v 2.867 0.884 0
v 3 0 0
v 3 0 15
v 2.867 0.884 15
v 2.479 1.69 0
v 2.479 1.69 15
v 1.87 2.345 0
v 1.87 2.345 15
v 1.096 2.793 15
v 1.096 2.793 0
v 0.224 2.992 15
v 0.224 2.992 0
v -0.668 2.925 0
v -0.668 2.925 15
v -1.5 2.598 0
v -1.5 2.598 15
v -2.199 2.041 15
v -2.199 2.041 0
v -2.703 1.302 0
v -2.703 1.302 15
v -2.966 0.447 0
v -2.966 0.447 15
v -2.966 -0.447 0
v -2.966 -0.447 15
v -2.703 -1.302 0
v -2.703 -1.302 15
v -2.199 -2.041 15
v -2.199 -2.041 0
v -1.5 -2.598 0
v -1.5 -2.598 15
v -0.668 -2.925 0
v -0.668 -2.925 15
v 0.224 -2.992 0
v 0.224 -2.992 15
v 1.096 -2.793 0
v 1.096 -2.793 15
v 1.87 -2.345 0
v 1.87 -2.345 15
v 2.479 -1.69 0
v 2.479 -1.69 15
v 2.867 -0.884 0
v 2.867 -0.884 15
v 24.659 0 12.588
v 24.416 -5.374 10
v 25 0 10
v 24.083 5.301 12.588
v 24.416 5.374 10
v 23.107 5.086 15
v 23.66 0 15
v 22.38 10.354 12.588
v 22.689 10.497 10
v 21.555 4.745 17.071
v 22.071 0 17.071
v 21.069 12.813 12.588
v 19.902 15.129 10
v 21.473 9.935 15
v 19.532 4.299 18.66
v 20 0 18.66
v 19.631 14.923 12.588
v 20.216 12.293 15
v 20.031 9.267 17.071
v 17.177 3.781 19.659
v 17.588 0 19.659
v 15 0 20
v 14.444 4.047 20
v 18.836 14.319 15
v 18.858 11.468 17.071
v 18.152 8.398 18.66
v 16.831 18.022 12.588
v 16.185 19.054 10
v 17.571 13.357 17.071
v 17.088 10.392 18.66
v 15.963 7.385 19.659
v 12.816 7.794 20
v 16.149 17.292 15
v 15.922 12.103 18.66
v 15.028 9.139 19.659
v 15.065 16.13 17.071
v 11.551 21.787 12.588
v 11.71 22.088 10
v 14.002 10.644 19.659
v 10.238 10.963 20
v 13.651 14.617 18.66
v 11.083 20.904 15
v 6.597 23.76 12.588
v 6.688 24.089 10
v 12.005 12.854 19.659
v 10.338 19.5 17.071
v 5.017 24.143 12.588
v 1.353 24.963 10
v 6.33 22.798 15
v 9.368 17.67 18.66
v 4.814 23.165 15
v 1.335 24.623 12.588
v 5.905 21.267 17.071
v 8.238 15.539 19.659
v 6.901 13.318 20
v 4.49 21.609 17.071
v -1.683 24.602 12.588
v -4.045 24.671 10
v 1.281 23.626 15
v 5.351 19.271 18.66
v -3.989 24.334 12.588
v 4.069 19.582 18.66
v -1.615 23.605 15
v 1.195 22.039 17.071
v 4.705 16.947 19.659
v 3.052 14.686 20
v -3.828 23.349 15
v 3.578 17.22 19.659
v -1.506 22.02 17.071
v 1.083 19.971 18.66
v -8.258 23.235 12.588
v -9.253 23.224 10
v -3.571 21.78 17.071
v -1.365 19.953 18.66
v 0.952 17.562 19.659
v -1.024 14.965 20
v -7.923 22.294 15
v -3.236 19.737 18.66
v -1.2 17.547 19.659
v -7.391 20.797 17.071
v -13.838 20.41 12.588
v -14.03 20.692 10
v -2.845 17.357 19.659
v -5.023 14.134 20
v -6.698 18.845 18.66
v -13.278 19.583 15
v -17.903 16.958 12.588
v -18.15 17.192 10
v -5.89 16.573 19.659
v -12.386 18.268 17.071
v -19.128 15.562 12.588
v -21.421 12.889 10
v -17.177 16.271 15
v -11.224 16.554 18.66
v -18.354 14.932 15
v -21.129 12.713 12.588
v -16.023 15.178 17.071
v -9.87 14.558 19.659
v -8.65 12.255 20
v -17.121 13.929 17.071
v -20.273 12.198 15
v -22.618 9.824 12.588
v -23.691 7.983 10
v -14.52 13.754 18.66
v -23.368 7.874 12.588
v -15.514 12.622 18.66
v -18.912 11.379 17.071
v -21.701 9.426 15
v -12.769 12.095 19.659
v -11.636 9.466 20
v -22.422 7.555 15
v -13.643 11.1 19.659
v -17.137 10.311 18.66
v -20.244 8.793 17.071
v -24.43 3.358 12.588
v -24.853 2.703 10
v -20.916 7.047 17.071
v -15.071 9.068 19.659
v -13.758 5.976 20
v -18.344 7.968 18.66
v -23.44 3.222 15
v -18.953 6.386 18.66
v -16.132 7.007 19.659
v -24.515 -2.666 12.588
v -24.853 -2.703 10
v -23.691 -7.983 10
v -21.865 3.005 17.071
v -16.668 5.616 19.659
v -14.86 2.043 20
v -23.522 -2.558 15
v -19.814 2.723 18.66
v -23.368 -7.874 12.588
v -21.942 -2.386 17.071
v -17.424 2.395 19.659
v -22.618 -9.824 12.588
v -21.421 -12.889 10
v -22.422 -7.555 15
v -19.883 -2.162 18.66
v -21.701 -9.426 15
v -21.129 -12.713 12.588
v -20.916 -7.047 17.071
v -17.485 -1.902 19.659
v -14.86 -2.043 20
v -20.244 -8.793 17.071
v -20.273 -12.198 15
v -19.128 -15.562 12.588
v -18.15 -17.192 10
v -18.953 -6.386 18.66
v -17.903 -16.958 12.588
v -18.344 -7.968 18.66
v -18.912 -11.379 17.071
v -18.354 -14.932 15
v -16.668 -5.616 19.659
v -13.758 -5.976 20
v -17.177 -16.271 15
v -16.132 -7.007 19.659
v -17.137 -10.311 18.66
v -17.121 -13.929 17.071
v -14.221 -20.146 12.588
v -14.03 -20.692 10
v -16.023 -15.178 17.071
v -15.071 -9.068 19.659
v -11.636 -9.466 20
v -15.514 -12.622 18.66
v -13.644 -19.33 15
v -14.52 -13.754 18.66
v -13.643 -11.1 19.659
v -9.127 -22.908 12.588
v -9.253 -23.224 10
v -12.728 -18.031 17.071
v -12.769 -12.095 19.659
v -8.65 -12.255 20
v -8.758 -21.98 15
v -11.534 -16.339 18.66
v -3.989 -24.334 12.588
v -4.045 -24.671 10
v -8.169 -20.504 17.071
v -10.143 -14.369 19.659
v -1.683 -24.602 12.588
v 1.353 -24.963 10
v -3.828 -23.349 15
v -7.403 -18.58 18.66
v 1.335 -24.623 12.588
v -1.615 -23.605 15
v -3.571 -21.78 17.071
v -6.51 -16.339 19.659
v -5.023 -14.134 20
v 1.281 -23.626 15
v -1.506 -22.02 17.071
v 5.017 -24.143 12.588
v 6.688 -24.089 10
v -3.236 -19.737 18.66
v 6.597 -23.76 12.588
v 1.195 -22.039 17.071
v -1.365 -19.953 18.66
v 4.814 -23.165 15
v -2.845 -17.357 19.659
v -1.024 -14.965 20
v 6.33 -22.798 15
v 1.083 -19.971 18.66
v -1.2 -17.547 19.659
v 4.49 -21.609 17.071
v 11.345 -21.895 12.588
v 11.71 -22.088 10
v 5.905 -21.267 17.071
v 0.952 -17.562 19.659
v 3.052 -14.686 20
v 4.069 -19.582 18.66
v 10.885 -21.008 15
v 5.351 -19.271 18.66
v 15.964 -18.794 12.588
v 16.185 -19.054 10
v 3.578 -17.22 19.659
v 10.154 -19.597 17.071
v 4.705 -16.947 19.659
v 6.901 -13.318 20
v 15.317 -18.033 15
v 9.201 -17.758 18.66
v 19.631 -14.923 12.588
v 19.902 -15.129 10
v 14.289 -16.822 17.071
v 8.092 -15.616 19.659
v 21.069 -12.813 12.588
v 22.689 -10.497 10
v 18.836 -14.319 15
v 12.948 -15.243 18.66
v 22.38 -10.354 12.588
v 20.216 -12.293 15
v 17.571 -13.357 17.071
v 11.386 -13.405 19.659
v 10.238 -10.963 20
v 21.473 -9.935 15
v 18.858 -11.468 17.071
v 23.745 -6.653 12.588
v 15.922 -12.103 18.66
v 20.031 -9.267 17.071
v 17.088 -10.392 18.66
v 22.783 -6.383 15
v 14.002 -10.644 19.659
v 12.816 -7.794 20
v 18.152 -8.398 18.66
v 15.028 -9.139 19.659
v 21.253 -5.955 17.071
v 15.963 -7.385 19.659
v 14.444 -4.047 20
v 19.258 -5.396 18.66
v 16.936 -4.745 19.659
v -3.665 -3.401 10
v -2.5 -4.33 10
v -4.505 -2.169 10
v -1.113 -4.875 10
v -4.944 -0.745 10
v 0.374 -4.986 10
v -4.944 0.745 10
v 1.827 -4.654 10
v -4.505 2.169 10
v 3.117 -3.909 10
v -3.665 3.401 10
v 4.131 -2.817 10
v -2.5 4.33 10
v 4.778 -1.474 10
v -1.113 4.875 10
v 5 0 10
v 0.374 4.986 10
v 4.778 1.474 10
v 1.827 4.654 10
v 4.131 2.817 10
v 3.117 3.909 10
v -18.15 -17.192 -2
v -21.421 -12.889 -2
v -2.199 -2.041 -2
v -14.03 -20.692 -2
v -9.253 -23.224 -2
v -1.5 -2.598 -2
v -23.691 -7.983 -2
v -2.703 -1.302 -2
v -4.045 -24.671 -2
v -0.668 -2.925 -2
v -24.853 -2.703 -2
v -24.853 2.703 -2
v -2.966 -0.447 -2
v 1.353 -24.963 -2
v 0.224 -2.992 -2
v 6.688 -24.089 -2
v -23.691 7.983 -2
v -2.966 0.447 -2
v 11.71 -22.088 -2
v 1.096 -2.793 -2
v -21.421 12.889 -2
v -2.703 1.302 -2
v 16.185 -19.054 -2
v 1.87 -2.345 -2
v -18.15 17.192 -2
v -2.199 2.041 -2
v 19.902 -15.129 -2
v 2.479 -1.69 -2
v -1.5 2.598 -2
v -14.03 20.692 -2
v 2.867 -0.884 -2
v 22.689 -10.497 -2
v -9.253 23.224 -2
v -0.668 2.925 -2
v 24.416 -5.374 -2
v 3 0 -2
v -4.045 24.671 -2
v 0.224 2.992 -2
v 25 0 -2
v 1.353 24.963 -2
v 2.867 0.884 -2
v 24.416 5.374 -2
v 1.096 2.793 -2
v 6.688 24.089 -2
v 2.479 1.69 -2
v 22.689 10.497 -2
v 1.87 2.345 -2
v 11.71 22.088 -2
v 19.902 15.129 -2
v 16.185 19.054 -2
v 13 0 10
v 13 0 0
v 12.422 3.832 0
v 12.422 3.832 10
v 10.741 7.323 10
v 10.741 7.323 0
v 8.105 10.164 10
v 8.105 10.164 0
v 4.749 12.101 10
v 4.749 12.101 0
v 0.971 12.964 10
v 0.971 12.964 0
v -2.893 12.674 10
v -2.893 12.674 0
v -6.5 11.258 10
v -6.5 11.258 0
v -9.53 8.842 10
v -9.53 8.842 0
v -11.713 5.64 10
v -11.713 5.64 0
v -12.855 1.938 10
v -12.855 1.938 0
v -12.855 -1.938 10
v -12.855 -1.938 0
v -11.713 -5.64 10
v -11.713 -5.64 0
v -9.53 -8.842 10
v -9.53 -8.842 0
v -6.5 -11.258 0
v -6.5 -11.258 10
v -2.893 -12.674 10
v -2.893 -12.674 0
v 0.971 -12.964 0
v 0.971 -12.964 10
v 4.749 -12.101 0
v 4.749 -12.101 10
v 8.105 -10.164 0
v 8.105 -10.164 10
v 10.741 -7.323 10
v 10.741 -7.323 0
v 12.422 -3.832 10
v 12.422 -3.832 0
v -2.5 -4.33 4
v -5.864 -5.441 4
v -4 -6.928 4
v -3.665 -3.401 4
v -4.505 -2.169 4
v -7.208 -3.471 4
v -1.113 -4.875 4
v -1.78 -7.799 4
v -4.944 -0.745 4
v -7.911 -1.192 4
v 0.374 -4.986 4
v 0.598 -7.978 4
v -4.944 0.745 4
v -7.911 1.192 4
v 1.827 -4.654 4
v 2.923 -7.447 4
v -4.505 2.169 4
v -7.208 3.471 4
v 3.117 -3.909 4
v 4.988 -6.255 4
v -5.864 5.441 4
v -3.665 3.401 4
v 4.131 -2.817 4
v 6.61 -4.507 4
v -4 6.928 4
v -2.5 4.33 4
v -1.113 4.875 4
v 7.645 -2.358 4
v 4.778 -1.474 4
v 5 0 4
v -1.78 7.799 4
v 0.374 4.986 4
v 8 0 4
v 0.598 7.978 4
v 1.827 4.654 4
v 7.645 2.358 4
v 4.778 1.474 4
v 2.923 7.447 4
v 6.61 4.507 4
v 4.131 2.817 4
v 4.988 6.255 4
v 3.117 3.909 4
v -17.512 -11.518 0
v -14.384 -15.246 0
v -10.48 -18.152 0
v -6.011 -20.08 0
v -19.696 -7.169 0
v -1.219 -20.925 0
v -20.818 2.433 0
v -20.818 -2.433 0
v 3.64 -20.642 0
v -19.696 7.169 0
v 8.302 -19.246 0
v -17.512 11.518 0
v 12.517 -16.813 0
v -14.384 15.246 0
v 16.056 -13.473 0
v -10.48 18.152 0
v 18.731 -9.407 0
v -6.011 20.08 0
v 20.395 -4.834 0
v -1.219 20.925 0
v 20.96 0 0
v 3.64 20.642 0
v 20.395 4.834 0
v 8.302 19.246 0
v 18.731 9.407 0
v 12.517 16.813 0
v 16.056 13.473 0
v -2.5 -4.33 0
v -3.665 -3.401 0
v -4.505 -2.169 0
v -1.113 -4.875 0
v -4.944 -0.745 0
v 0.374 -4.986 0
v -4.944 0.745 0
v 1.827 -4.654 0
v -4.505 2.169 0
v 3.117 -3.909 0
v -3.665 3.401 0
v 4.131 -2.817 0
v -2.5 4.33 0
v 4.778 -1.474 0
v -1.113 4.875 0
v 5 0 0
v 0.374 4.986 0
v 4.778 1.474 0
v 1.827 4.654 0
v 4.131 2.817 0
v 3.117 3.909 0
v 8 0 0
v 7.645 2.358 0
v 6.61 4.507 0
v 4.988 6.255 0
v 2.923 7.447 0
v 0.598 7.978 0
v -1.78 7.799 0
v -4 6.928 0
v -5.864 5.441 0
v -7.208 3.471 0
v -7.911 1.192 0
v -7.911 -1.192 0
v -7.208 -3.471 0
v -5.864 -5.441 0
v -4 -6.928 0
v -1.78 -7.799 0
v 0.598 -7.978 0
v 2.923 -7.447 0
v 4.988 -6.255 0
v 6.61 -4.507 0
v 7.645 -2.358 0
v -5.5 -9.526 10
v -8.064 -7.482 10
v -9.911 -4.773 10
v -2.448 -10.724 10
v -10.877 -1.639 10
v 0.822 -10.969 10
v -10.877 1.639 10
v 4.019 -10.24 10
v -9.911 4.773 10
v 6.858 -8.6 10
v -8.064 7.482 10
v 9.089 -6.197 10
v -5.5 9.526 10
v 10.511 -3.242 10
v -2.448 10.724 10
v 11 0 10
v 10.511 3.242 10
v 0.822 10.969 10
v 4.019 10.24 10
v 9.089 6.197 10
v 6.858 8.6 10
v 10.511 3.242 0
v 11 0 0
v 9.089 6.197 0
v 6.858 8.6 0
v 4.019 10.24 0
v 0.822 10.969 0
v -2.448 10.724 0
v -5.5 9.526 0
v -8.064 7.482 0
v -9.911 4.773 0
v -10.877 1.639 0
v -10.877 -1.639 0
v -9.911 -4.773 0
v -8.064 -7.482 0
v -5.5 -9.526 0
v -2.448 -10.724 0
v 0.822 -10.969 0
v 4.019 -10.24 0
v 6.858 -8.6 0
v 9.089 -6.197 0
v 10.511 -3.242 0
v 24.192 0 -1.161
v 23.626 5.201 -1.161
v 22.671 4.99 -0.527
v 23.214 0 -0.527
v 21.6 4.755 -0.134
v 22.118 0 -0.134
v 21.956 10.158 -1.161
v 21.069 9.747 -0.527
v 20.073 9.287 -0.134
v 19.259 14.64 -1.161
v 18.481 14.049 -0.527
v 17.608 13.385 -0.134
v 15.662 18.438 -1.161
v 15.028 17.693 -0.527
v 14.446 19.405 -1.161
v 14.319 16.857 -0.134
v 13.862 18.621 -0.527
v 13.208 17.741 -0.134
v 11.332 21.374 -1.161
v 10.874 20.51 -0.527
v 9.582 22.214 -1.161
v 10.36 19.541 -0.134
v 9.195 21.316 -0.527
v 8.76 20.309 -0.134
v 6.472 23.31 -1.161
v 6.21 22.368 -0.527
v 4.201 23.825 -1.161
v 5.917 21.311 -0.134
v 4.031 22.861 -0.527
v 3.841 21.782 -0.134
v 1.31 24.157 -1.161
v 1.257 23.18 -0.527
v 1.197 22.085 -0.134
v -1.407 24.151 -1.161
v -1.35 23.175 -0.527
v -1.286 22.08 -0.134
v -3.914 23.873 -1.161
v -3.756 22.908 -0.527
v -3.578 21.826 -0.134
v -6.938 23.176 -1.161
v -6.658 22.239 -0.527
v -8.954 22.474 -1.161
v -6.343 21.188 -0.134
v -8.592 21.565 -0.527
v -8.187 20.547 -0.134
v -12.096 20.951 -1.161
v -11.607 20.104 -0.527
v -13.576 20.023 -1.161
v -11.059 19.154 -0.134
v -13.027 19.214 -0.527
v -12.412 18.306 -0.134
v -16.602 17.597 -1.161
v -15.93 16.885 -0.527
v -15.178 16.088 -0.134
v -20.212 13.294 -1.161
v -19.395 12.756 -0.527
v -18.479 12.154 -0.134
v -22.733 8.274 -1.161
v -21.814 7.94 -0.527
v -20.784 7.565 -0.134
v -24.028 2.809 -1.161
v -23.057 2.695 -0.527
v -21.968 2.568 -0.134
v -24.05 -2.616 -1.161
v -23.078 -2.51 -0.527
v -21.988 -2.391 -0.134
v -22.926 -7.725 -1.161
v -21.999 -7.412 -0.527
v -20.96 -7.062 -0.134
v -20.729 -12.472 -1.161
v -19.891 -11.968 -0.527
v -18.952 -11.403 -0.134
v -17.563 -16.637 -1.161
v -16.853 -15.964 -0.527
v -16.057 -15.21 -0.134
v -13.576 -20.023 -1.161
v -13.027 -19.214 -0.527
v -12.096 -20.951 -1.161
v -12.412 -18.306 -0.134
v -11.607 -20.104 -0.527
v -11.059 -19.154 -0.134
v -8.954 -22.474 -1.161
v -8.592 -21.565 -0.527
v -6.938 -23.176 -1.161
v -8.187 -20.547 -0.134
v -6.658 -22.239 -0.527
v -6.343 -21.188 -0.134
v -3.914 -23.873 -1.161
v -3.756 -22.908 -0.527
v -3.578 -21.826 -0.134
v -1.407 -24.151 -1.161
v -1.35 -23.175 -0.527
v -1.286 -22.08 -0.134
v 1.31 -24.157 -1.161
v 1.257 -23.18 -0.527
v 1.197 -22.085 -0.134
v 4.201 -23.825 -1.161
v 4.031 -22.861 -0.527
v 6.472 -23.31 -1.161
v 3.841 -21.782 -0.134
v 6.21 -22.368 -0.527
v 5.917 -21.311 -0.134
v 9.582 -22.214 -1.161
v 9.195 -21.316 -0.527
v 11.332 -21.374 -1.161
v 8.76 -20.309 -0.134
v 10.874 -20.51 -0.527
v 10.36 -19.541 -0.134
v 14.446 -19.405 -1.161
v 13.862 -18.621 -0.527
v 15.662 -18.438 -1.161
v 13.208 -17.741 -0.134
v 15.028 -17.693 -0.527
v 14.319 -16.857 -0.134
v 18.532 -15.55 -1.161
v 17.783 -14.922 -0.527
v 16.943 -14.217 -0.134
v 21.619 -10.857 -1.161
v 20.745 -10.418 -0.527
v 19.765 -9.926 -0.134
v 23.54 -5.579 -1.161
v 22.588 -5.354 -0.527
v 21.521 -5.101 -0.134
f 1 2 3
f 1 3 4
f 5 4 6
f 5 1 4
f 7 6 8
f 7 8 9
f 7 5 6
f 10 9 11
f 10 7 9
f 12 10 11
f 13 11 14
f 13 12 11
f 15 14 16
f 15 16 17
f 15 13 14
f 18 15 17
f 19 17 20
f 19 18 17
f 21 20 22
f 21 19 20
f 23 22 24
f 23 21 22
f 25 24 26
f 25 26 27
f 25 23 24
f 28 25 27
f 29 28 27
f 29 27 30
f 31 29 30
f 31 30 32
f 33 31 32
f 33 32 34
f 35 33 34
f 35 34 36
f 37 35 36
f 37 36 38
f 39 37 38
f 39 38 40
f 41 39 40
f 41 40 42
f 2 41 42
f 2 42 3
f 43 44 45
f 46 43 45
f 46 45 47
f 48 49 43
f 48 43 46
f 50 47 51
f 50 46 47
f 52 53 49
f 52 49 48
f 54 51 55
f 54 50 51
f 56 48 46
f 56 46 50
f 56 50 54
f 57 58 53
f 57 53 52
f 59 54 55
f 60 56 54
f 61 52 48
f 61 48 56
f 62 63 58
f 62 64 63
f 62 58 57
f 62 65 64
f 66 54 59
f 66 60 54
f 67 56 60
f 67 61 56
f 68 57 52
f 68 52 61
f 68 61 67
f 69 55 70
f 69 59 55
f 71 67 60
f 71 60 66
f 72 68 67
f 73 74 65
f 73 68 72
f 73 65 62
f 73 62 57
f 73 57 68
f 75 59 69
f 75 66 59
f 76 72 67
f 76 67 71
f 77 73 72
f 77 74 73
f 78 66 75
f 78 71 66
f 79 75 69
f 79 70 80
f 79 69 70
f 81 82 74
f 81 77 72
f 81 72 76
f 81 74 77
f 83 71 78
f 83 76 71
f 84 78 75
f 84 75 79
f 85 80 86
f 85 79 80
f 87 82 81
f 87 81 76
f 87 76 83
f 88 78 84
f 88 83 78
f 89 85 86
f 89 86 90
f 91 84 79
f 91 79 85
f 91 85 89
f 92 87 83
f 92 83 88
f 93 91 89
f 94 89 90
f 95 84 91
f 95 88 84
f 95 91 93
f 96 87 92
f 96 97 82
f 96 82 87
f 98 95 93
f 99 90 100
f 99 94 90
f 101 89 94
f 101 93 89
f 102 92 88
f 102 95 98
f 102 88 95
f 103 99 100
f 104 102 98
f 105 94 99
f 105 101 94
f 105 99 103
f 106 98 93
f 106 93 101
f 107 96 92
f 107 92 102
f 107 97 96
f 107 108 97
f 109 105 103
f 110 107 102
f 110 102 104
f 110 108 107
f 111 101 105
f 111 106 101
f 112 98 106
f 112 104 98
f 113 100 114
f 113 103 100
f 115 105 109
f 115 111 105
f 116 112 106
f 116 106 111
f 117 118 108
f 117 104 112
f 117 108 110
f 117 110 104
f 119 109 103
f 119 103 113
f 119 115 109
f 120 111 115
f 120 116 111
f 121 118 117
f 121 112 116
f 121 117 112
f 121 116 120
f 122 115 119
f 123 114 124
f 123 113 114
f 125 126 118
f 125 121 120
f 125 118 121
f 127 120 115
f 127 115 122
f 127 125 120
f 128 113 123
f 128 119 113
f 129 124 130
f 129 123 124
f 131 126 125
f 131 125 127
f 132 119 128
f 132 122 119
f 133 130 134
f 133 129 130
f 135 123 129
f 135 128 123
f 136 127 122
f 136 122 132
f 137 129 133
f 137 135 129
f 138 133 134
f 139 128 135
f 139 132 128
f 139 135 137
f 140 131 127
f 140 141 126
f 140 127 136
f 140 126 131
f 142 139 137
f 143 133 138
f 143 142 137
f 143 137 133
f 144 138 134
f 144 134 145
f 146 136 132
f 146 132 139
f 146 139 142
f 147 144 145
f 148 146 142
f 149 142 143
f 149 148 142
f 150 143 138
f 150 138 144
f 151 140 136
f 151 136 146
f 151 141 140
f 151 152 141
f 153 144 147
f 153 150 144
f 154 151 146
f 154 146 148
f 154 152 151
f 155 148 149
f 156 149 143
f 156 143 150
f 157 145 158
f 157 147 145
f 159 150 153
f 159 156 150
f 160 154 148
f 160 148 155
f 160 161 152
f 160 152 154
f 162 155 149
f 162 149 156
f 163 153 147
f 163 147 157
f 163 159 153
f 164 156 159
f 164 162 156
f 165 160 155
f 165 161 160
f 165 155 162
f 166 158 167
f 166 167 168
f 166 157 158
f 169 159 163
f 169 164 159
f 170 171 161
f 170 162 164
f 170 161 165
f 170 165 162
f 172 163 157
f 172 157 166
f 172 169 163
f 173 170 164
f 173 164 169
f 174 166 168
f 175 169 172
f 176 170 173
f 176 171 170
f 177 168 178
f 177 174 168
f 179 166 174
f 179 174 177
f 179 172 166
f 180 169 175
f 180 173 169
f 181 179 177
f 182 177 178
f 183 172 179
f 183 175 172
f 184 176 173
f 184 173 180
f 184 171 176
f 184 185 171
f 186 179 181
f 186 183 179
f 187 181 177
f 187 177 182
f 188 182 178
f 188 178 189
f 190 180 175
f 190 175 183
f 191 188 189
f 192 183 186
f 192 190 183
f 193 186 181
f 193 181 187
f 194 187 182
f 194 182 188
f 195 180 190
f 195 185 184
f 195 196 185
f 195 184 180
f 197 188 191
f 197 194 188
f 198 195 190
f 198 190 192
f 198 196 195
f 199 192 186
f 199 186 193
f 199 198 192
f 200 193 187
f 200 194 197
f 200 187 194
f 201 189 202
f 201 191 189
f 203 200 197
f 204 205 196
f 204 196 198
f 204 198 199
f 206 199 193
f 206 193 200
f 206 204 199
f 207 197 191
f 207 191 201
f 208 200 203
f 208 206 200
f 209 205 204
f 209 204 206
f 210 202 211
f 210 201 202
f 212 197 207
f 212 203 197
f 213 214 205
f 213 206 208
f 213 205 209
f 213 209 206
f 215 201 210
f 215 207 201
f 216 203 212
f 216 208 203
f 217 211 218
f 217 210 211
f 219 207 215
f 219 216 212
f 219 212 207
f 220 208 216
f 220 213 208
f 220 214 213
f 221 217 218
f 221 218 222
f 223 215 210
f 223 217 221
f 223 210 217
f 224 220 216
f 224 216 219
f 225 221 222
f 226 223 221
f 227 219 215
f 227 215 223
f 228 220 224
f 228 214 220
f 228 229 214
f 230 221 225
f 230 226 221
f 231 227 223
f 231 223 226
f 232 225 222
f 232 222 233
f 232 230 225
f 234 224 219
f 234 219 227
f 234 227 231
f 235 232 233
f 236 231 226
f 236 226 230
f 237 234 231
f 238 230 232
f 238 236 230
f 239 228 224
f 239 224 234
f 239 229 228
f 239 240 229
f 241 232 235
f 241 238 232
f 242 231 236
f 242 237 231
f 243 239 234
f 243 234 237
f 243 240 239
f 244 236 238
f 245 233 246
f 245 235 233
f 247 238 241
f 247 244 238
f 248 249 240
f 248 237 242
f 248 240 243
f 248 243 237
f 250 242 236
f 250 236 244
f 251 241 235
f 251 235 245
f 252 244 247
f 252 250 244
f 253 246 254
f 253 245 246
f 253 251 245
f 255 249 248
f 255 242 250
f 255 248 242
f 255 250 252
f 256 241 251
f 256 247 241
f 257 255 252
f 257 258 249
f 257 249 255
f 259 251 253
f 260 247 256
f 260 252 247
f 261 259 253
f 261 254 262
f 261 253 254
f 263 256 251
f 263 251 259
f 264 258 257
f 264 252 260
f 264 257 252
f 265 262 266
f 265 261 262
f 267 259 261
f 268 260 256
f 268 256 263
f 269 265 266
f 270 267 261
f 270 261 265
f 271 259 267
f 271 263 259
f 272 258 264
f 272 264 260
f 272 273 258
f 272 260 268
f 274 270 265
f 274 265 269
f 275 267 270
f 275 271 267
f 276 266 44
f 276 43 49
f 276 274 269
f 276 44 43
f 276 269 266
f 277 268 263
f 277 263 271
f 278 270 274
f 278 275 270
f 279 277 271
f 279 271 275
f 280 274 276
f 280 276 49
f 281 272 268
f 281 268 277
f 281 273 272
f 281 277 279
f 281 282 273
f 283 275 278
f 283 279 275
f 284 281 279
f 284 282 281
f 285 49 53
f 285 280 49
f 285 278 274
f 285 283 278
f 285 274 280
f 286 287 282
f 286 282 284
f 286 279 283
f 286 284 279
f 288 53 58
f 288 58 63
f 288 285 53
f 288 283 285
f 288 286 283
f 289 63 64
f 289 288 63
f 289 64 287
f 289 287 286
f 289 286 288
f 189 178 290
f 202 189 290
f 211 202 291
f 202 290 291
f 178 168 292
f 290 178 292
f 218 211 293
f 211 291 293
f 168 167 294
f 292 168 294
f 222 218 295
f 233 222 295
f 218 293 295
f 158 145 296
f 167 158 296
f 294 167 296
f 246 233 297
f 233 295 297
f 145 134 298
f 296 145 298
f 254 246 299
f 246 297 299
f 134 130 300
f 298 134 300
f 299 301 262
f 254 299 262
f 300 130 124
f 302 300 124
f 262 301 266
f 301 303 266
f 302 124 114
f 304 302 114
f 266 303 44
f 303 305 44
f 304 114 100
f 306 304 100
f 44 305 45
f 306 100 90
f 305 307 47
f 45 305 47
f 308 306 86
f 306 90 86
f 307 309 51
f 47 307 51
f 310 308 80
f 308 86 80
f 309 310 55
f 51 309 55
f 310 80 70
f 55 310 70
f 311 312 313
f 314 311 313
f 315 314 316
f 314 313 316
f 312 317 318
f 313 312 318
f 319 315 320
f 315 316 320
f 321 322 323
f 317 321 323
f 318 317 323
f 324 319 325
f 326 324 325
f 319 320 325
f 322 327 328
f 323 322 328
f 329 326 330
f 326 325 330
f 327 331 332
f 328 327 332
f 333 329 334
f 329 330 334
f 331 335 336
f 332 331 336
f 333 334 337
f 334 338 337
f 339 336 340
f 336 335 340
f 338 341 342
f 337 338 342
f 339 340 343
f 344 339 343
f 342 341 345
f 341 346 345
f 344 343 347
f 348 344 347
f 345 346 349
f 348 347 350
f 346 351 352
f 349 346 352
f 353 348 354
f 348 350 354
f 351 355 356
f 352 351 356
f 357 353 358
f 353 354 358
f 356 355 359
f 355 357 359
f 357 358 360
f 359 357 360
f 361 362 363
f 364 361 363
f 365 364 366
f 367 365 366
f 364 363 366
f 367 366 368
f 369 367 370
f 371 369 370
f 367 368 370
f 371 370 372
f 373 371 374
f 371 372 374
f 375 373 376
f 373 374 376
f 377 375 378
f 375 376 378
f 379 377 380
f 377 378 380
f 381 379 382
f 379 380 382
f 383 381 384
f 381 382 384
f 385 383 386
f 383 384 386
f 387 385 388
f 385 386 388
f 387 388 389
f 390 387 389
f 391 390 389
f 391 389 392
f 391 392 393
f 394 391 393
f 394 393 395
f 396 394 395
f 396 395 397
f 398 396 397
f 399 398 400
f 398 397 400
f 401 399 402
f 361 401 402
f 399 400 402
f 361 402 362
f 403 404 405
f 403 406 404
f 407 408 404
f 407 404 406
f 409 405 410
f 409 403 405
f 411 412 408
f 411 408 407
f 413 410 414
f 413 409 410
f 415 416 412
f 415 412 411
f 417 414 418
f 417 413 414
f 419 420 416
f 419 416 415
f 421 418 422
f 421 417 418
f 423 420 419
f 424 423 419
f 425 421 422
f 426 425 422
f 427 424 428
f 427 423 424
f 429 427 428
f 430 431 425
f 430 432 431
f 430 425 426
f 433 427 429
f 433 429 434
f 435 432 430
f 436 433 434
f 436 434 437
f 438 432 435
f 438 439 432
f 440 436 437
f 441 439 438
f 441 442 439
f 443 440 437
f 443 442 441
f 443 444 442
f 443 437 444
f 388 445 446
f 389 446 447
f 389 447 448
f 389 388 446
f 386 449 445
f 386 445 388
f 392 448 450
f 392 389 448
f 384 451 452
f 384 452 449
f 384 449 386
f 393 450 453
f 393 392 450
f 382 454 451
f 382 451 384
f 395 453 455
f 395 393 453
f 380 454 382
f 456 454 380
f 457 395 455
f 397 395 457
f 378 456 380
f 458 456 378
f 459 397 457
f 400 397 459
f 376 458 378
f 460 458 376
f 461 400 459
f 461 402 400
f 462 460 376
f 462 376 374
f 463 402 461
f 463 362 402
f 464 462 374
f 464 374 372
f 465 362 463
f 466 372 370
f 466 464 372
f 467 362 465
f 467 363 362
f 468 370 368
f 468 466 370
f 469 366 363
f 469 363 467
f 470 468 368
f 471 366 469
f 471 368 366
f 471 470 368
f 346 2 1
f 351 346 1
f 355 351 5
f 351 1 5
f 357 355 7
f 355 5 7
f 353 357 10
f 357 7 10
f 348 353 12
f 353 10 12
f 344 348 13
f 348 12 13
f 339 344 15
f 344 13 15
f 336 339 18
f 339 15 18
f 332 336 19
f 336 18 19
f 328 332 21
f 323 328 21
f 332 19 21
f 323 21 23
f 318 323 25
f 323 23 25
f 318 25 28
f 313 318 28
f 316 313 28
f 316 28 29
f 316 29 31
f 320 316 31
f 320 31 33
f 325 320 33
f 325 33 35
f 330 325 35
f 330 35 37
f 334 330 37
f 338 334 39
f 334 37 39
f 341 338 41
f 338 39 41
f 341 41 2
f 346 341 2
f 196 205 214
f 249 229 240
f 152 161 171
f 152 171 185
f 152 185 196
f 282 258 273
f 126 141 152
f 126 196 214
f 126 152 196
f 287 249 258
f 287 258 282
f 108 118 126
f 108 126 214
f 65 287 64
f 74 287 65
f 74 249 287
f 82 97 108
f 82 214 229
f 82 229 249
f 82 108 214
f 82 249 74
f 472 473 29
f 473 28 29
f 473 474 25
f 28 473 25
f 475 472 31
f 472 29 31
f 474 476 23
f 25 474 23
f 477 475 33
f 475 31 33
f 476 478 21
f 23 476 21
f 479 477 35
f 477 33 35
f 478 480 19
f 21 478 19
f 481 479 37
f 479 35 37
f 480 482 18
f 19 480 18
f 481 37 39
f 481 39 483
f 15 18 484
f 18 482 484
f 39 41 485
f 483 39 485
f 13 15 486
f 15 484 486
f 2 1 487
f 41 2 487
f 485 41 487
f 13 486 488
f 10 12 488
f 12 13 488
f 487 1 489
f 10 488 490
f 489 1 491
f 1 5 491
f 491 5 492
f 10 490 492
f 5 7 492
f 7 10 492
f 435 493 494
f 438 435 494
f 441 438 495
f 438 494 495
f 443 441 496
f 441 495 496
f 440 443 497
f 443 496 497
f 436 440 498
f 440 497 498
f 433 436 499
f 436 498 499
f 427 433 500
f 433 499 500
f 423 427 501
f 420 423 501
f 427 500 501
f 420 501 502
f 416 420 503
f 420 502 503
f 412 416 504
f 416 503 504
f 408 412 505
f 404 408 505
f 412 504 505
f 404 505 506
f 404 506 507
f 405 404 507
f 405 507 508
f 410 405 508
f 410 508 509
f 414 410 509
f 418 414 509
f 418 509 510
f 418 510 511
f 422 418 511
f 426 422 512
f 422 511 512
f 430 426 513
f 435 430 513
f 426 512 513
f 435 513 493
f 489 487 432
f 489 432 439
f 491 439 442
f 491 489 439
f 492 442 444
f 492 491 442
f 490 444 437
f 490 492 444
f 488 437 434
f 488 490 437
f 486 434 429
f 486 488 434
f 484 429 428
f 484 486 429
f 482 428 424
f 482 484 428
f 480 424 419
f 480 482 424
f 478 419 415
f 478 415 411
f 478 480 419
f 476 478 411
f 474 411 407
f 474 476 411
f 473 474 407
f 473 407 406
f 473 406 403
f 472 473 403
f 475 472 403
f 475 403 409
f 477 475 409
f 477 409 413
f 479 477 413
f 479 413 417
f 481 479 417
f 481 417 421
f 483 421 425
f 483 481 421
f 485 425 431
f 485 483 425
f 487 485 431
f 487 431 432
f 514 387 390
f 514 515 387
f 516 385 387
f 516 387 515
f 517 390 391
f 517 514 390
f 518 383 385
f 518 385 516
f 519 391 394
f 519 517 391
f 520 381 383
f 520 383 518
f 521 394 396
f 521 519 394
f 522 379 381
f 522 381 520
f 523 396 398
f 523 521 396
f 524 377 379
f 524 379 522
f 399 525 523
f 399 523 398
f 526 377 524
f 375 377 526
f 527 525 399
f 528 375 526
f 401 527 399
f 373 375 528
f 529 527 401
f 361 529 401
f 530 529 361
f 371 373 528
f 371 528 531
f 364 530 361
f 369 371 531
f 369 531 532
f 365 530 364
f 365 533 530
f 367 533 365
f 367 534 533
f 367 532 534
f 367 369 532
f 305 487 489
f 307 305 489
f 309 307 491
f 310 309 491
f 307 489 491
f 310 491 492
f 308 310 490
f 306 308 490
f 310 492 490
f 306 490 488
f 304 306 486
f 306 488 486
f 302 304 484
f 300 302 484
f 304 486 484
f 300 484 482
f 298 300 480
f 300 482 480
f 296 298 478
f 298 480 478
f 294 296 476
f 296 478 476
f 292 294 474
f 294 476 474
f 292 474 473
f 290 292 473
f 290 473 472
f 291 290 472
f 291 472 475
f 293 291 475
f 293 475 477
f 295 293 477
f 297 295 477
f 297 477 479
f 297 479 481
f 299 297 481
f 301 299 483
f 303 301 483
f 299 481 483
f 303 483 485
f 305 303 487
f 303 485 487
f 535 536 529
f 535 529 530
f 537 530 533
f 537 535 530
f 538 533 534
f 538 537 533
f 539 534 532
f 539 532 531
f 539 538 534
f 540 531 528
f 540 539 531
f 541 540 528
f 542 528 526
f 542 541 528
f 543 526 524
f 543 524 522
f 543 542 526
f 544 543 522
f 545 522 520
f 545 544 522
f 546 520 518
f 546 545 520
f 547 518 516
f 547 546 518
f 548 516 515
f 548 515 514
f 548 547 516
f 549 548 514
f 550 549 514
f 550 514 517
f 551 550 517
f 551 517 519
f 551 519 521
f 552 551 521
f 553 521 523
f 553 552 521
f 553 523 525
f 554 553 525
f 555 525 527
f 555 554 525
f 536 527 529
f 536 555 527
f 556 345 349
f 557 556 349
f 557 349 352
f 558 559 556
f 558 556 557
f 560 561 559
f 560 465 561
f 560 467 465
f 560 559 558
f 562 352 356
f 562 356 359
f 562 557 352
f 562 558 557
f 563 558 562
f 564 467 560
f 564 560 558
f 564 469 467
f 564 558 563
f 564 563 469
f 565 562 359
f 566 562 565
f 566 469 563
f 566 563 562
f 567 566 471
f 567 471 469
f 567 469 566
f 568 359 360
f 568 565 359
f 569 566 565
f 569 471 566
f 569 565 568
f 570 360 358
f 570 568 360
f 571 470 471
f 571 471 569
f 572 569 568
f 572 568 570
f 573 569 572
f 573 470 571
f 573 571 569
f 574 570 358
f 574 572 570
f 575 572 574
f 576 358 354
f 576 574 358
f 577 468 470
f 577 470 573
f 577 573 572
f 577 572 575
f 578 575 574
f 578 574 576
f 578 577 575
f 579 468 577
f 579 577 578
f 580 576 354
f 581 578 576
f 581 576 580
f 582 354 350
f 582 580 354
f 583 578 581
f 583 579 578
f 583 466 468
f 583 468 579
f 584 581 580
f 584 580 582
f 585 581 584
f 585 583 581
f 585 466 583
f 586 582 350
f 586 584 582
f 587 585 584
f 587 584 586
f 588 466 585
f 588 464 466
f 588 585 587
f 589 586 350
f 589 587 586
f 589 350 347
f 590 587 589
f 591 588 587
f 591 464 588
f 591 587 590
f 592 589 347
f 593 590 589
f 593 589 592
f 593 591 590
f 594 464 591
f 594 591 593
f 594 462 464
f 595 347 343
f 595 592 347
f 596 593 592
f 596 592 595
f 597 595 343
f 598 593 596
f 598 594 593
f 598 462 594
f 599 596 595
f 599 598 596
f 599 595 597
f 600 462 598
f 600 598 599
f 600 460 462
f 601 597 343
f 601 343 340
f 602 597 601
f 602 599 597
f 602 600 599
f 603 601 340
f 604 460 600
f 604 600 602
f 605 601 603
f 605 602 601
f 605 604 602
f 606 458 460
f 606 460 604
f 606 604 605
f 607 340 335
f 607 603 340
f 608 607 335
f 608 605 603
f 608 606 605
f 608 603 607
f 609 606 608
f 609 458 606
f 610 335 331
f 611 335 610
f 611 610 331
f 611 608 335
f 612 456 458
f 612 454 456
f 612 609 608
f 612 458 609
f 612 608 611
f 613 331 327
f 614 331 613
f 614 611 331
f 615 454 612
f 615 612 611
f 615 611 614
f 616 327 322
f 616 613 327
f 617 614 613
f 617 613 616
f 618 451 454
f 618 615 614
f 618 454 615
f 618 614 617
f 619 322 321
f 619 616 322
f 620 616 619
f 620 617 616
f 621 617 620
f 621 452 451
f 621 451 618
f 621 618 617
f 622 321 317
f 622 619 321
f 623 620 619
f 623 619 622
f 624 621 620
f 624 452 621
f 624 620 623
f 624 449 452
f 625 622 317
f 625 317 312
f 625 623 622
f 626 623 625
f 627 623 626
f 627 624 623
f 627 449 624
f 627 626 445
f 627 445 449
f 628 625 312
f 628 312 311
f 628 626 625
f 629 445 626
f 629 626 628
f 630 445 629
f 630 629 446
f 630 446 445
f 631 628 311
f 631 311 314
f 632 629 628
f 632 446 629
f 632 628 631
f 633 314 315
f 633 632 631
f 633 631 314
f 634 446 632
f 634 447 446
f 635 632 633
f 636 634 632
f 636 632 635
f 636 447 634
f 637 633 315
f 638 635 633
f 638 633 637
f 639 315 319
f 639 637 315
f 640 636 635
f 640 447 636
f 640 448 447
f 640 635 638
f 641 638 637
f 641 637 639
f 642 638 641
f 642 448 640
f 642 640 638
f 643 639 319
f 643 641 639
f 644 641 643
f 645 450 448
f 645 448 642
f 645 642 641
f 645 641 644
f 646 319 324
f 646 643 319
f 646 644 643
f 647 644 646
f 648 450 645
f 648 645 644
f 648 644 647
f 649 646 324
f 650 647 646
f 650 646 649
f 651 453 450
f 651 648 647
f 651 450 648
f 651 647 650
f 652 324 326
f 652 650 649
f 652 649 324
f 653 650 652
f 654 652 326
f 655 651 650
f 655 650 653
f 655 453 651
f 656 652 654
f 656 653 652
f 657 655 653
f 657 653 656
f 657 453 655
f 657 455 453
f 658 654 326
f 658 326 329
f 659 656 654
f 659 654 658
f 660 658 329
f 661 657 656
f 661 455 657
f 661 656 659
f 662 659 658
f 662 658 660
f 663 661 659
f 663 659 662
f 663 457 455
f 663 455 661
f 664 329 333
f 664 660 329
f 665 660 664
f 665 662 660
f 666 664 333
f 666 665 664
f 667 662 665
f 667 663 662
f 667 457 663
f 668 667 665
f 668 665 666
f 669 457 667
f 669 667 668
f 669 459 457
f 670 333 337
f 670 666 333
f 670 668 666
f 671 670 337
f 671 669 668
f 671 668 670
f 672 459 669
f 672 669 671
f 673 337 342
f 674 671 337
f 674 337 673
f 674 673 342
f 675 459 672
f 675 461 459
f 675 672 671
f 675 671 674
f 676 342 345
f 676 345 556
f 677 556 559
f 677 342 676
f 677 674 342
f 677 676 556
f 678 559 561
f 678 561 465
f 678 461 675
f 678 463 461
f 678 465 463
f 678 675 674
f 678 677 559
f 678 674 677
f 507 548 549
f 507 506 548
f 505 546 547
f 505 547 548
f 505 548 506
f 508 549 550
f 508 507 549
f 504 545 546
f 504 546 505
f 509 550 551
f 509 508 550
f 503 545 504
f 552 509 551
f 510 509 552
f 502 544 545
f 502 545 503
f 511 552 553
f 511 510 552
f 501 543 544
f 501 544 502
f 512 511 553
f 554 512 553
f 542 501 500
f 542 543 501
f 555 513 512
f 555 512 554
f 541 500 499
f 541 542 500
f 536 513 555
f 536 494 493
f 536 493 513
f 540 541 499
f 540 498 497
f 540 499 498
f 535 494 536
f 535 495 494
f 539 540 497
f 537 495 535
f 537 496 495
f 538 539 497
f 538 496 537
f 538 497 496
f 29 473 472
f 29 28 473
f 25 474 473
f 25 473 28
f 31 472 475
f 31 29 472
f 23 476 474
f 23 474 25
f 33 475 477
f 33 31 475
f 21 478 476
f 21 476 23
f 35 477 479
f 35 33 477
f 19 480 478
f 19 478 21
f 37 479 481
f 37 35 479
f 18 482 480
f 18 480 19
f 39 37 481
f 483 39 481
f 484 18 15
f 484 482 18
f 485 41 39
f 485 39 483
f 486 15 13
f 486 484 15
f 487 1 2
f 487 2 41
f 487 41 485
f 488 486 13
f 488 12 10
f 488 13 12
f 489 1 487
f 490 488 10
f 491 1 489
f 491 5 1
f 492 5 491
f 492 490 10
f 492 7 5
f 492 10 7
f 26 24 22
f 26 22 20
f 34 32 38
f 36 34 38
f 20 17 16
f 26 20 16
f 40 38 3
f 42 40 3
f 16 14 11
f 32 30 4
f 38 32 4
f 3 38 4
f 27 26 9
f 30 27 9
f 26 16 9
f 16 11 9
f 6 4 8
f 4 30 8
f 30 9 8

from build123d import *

# Parameters (mm, degrees)
F0_R     = 25
F0_R_2   = 13
F0_R_3   = 11
F0_R_4   = 8
F0_R_5   = 5
F0_R_6   = 3
F1_DEPTH = 2
F2_DEPTH = 10
F3_DEPTH = 4
F5_DEPTH = 20
F6_DEPTH = 20
F7_DEPTH = 10
F8_R     = 9.99999
F9_START = 15
F9_DEPTH = 5


# Not quite as in the source:
# - a fillet or chamfer that OpenCascade refuses, or shapes differently, is made with other operations: its cross-section is extruded or revolved along the edge and cut away or added
# - a fillet or chamfer is up to 0.001 mm smaller than in the source, because OpenCascade refuses the exact size


with BuildPart() as f1:
    # F0 (on Top) → F1 (new body)
    with BuildSketch(Plane.XY):
        Circle(F0_R)
        Circle(F0_R_2, mode=Mode.SUBTRACT)
        Circle(F0_R_2)
        Circle(F0_R_3, mode=Mode.SUBTRACT)
        Circle(F0_R_3)
        Circle(F0_R_4, mode=Mode.SUBTRACT)
        Circle(F0_R_4)
        Circle(F0_R_5, mode=Mode.SUBTRACT)
        Circle(F0_R_5)
        Circle(F0_R_6, mode=Mode.SUBTRACT)
    extrude(amount=-F1_DEPTH)

    # F0 (on Top) → F2 (join)
    with BuildSketch(Plane.XY):
        Circle(F0_R_2)
        Circle(F0_R_3, mode=Mode.SUBTRACT)
    extrude(amount=F2_DEPTH)

    # F0 (on Top) → F3 (join)
    with BuildSketch(Plane.XY):
        Circle(F0_R_4)
        Circle(F0_R_5, mode=Mode.SUBTRACT)
    extrude(amount=F3_DEPTH)

    # F4: fillet of radius 5.08 on 1 edges, made by hand

    # F4_s1 → F4_t2 (revolve, cut)
    with BuildSketch(Plane.XZ):
        with BuildLine():
            ThreePointArc((25, -2), (23.2140835586, -0.5273743839), (20.9601980247, 0))
            Line((20.9601980247, 0), (25, 0))
            Line((25, 0), (25, -2))
        make_face()
    revolve(axis=Axis((0, 0, 0), (0, 0, 1)), mode=Mode.SUBTRACT)


with BuildPart() as f5:
    # F0 (on Top) → F5 (new body)
    with BuildSketch(Plane.XY):
        Circle(F0_R_5)
        Circle(F0_R_6, mode=Mode.SUBTRACT)
    extrude(amount=F5_DEPTH)

    # F0 (on Top) → F6 (join)
    with BuildSketch(Plane.XY):
        Circle(F0_R)
        Circle(F0_R_2, mode=Mode.SUBTRACT)
        Circle(F0_R_2)
        Circle(F0_R_3, mode=Mode.SUBTRACT)
        Circle(F0_R_3)
        Circle(F0_R_4, mode=Mode.SUBTRACT)
        Circle(F0_R_4)
        Circle(F0_R_5, mode=Mode.SUBTRACT)
    extrude(amount=F6_DEPTH)

    # F0 (on Top) → F7 (cut)
    with BuildSketch(Plane.XY):
        Circle(F0_R)
        Circle(F0_R_2, mode=Mode.SUBTRACT)
        Circle(F0_R_2)
        Circle(F0_R_3, mode=Mode.SUBTRACT)
        Circle(F0_R_3)
        Circle(F0_R_4, mode=Mode.SUBTRACT)
        Circle(F0_R_4)
        Circle(F0_R_5, mode=Mode.SUBTRACT)
    extrude(amount=F7_DEPTH, mode=Mode.SUBTRACT)

    # F8 (radius 10 in the source; OpenCascade refuses exactly that, so slightly less here)
    f8_edges = [f5.edges().sort_by_distance(p)[0] for p in [
        (-25, 0, 20),
    ]]
    fillet(f8_edges, radius=F8_R)

    # F0 (on Top) → F9 (join)
    with BuildSketch(Plane.XY.offset(F9_START)):
        Circle(F0_R_6)
    extrude(amount=F9_DEPTH)


solid = Compound([f1.part, f5.part])
